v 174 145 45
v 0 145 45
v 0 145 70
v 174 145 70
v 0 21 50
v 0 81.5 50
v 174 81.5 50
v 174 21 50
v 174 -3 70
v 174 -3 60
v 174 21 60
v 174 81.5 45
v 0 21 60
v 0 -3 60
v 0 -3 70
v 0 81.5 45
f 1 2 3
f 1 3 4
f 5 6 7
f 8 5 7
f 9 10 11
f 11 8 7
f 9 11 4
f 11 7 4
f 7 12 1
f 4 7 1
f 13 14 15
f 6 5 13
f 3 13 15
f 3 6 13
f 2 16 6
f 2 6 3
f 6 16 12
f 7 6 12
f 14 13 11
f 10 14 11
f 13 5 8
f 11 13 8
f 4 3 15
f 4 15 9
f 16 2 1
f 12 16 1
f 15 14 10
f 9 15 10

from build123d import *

# Parameters (mm, degrees)
BOX041_W     = 174
BOX041_H     = 60.5
BOX041_DEPTH = 10
BOX042_W     = 174
BOX042_H     = 148
BOX042_DEPTH = 10
BOX040_W     = 174
BOX040_H     = 63.5
BOX040_DEPTH = 15


with BuildPart() as topmiddlebump:
    # Box041 → Box041 (new body)
    with BuildSketch(Plane(origin=(0, 21, 50), x_dir=(1, 0, 0), z_dir=(0, 0, 1))):
        with Locations((87, 30.25)):
            Rectangle(BOX041_W, BOX041_H)
    extrude(amount=BOX041_DEPTH)


with BuildPart() as tophighbump:
    # Box042 → Box042 (new body)
    with BuildSketch(Plane(origin=(0, -3, 60), x_dir=(1, 0, 0), z_dir=(0, 0, 1))):
        with Locations((87, 74)):
            Rectangle(BOX042_W, BOX042_H)
    extrude(amount=BOX042_DEPTH)


with BuildPart() as topbump:
    # Box040 → Box040 (new body)
    with BuildSketch(Plane(origin=(0, 81.5, 45), x_dir=(1, 0, 0), z_dir=(0, 0, 1))):
        with Locations((87, 31.75)):
            Rectangle(BOX040_W, BOX040_H)
    extrude(amount=BOX040_DEPTH)

    # Fusion010: union TopMiddleBump, TopHighBump
    add(topmiddlebump.part)
    add(tophighbump.part)


solid = topbump.part
